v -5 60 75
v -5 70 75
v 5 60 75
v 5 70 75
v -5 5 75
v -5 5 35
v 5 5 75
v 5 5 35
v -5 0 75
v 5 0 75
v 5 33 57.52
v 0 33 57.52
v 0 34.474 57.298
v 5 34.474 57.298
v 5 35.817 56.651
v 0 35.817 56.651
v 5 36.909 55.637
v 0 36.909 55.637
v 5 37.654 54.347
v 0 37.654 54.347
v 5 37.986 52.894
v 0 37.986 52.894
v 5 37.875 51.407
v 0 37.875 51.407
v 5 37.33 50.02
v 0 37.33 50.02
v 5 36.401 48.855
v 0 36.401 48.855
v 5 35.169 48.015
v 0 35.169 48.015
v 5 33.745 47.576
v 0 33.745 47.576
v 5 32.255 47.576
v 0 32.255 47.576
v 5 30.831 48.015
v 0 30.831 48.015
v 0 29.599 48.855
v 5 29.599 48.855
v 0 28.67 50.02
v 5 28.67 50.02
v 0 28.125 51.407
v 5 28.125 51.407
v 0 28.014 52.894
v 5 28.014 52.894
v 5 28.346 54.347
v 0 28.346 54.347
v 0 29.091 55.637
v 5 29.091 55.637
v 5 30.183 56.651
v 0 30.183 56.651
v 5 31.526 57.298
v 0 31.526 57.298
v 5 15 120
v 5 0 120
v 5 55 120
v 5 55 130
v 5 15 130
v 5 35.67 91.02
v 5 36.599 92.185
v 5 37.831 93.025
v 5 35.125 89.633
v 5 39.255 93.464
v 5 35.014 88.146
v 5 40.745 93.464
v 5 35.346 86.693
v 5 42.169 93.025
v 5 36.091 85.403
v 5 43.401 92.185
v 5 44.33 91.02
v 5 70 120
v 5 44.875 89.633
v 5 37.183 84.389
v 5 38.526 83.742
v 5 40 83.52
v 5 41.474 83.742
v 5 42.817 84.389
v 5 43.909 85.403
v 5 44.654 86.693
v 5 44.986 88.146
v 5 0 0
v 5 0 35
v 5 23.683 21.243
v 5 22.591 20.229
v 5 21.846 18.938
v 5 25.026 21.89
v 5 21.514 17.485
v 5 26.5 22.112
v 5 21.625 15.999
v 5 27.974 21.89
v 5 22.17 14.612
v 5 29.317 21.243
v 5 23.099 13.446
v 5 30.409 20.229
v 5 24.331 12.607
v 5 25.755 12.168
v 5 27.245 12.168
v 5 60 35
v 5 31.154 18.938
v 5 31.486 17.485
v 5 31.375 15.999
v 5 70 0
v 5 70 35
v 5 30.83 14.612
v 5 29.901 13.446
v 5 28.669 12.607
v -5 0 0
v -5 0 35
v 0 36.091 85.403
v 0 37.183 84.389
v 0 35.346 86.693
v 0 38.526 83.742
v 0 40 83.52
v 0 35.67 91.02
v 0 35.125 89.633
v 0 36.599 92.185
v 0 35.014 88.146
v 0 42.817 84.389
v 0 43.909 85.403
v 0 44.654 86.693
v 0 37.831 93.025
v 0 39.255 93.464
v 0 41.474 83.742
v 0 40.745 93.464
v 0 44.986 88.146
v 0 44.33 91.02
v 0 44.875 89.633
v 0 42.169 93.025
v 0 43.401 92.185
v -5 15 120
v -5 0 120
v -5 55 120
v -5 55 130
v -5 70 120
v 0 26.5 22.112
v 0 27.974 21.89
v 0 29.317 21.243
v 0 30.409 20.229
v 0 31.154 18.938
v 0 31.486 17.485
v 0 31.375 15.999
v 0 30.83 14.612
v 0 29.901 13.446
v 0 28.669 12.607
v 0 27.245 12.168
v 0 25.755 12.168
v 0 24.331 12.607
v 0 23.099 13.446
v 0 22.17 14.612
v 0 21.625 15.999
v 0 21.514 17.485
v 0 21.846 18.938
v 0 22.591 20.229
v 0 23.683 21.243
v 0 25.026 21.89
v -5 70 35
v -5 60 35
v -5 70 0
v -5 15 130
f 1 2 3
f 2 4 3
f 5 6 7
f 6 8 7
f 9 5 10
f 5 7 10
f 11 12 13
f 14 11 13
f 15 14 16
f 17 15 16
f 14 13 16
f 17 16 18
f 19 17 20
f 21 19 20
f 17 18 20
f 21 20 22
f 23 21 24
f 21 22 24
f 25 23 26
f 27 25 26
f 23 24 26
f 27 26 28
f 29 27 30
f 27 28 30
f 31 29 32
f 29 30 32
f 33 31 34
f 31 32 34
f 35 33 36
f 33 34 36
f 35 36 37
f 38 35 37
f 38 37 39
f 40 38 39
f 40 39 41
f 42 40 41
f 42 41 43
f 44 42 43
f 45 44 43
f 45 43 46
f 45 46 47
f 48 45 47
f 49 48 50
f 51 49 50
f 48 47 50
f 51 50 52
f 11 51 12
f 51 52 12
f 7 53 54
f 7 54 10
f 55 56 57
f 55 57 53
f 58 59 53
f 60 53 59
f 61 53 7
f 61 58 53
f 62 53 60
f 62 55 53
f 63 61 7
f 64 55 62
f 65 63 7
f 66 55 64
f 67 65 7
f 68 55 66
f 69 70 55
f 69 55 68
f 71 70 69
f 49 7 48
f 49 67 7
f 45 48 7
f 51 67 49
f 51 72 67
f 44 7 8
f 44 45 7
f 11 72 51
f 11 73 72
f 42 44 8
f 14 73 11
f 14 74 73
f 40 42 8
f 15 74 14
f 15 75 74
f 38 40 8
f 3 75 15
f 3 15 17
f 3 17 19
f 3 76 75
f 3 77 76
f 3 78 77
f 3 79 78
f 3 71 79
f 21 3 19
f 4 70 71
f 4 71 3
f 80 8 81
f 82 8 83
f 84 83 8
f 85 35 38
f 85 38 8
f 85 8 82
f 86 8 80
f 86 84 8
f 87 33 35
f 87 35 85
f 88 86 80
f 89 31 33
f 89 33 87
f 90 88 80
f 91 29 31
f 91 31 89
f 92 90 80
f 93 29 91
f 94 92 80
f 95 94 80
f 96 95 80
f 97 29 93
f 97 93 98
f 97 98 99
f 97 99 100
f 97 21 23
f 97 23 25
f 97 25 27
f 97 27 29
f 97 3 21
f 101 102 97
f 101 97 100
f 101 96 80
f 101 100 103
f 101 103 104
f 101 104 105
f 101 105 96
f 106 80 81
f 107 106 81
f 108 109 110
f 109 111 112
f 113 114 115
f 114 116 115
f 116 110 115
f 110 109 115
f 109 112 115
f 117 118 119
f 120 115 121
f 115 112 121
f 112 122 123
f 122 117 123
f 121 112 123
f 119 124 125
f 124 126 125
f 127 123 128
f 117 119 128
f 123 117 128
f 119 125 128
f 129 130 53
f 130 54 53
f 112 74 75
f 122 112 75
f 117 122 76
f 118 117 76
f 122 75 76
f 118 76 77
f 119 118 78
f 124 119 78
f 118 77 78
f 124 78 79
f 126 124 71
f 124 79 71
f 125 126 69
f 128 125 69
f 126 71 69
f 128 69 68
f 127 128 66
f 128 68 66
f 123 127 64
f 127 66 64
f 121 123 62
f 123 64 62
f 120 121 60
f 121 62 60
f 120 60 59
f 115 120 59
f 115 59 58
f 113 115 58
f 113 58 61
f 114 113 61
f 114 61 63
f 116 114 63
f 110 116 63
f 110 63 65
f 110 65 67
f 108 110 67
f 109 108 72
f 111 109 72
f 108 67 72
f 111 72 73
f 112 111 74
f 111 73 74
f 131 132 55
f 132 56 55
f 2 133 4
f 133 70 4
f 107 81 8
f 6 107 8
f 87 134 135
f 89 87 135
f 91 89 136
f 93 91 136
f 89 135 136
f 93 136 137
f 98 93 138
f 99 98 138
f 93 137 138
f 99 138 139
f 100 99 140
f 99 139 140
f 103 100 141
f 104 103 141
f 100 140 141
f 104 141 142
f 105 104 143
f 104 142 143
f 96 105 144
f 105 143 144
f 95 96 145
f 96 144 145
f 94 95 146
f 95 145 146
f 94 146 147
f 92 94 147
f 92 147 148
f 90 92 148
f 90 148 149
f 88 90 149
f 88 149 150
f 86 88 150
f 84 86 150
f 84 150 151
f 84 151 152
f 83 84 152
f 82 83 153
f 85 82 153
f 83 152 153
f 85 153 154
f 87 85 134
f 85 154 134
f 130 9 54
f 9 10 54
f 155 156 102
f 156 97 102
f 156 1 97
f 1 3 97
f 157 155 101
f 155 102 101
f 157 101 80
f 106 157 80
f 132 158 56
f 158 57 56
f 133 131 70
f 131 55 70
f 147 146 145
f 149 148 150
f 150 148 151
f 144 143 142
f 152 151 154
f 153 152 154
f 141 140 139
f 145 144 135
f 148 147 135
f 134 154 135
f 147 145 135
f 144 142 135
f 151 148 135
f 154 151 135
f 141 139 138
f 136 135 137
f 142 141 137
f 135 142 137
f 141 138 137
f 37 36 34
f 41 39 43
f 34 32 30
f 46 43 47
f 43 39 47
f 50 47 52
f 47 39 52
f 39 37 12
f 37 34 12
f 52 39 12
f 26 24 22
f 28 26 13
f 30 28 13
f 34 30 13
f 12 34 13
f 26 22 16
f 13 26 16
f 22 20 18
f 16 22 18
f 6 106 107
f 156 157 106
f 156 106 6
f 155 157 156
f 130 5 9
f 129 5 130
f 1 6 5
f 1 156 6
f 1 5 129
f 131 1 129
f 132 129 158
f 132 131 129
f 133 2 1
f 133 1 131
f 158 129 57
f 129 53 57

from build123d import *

# Parameters (mm, degrees)
BOSS_EXTRUDE1_DEPTH = 5
SKETCH5_R           = 5
CUT_EXTRUDE4_DEPTH  = 5
SKETCH2_R           = 5
CUT_EXTRUDE5_DEPTH  = 5
BOSS_EXTRUDE2_DEPTH = 5


with BuildPart() as part:
    # Sketch1 → Boss-Extrude1 (new body)
    with BuildSketch(Plane(origin=(0, 0, 0), x_dir=(0, 0, -1), z_dir=(1, 0, 0))):
        Polygon((-75, 70), (-120, 70), (-120, 55), (-130, 55), (-130, 15), (-120, 15), (-120, 0), (-75, 0), (-75, 5), (-35, 5), (-35, 0), (-10, 0), (0, 0), (0, 15), (0, 55), (0, 70), (-10, 70), (-35, 70), (-35, 60), (-75, 60), align=None)
    extrude(amount=BOSS_EXTRUDE1_DEPTH)

    # Sketch5 → Cut-Extrude4 (cut)
    with BuildSketch(Plane.ZY):
        with Locations((17.111667647, 26.5)):
            Circle(SKETCH5_R)
        with Locations((52.52, 33)):
            Circle(SKETCH5_R)
    extrude(amount=-CUT_EXTRUDE4_DEPTH, mode=Mode.SUBTRACT)

    # Sketch2 → Cut-Extrude5 (cut)
    with BuildSketch(Plane(origin=(5, 0, 0), x_dir=(0, 0, -1), z_dir=(1, 0, 0))):
        with Locations((-88.52, 40)):
            Circle(SKETCH2_R)
    extrude(amount=-CUT_EXTRUDE5_DEPTH, mode=Mode.SUBTRACT)

    # Sketch6 → Boss-Extrude2 (add)
    with BuildSketch(Plane.ZY):
        Polygon((35, 0), (35, 5), (75, 5), (75, 0), (120, 0), (120, 15), (130, 15), (130, 55), (120, 55), (120, 70), (75, 70), (75, 60), (35, 60), (35, 70), (0, 70), (0, 0), align=None)
    extrude(amount=BOSS_EXTRUDE2_DEPTH)


solid = part.part
